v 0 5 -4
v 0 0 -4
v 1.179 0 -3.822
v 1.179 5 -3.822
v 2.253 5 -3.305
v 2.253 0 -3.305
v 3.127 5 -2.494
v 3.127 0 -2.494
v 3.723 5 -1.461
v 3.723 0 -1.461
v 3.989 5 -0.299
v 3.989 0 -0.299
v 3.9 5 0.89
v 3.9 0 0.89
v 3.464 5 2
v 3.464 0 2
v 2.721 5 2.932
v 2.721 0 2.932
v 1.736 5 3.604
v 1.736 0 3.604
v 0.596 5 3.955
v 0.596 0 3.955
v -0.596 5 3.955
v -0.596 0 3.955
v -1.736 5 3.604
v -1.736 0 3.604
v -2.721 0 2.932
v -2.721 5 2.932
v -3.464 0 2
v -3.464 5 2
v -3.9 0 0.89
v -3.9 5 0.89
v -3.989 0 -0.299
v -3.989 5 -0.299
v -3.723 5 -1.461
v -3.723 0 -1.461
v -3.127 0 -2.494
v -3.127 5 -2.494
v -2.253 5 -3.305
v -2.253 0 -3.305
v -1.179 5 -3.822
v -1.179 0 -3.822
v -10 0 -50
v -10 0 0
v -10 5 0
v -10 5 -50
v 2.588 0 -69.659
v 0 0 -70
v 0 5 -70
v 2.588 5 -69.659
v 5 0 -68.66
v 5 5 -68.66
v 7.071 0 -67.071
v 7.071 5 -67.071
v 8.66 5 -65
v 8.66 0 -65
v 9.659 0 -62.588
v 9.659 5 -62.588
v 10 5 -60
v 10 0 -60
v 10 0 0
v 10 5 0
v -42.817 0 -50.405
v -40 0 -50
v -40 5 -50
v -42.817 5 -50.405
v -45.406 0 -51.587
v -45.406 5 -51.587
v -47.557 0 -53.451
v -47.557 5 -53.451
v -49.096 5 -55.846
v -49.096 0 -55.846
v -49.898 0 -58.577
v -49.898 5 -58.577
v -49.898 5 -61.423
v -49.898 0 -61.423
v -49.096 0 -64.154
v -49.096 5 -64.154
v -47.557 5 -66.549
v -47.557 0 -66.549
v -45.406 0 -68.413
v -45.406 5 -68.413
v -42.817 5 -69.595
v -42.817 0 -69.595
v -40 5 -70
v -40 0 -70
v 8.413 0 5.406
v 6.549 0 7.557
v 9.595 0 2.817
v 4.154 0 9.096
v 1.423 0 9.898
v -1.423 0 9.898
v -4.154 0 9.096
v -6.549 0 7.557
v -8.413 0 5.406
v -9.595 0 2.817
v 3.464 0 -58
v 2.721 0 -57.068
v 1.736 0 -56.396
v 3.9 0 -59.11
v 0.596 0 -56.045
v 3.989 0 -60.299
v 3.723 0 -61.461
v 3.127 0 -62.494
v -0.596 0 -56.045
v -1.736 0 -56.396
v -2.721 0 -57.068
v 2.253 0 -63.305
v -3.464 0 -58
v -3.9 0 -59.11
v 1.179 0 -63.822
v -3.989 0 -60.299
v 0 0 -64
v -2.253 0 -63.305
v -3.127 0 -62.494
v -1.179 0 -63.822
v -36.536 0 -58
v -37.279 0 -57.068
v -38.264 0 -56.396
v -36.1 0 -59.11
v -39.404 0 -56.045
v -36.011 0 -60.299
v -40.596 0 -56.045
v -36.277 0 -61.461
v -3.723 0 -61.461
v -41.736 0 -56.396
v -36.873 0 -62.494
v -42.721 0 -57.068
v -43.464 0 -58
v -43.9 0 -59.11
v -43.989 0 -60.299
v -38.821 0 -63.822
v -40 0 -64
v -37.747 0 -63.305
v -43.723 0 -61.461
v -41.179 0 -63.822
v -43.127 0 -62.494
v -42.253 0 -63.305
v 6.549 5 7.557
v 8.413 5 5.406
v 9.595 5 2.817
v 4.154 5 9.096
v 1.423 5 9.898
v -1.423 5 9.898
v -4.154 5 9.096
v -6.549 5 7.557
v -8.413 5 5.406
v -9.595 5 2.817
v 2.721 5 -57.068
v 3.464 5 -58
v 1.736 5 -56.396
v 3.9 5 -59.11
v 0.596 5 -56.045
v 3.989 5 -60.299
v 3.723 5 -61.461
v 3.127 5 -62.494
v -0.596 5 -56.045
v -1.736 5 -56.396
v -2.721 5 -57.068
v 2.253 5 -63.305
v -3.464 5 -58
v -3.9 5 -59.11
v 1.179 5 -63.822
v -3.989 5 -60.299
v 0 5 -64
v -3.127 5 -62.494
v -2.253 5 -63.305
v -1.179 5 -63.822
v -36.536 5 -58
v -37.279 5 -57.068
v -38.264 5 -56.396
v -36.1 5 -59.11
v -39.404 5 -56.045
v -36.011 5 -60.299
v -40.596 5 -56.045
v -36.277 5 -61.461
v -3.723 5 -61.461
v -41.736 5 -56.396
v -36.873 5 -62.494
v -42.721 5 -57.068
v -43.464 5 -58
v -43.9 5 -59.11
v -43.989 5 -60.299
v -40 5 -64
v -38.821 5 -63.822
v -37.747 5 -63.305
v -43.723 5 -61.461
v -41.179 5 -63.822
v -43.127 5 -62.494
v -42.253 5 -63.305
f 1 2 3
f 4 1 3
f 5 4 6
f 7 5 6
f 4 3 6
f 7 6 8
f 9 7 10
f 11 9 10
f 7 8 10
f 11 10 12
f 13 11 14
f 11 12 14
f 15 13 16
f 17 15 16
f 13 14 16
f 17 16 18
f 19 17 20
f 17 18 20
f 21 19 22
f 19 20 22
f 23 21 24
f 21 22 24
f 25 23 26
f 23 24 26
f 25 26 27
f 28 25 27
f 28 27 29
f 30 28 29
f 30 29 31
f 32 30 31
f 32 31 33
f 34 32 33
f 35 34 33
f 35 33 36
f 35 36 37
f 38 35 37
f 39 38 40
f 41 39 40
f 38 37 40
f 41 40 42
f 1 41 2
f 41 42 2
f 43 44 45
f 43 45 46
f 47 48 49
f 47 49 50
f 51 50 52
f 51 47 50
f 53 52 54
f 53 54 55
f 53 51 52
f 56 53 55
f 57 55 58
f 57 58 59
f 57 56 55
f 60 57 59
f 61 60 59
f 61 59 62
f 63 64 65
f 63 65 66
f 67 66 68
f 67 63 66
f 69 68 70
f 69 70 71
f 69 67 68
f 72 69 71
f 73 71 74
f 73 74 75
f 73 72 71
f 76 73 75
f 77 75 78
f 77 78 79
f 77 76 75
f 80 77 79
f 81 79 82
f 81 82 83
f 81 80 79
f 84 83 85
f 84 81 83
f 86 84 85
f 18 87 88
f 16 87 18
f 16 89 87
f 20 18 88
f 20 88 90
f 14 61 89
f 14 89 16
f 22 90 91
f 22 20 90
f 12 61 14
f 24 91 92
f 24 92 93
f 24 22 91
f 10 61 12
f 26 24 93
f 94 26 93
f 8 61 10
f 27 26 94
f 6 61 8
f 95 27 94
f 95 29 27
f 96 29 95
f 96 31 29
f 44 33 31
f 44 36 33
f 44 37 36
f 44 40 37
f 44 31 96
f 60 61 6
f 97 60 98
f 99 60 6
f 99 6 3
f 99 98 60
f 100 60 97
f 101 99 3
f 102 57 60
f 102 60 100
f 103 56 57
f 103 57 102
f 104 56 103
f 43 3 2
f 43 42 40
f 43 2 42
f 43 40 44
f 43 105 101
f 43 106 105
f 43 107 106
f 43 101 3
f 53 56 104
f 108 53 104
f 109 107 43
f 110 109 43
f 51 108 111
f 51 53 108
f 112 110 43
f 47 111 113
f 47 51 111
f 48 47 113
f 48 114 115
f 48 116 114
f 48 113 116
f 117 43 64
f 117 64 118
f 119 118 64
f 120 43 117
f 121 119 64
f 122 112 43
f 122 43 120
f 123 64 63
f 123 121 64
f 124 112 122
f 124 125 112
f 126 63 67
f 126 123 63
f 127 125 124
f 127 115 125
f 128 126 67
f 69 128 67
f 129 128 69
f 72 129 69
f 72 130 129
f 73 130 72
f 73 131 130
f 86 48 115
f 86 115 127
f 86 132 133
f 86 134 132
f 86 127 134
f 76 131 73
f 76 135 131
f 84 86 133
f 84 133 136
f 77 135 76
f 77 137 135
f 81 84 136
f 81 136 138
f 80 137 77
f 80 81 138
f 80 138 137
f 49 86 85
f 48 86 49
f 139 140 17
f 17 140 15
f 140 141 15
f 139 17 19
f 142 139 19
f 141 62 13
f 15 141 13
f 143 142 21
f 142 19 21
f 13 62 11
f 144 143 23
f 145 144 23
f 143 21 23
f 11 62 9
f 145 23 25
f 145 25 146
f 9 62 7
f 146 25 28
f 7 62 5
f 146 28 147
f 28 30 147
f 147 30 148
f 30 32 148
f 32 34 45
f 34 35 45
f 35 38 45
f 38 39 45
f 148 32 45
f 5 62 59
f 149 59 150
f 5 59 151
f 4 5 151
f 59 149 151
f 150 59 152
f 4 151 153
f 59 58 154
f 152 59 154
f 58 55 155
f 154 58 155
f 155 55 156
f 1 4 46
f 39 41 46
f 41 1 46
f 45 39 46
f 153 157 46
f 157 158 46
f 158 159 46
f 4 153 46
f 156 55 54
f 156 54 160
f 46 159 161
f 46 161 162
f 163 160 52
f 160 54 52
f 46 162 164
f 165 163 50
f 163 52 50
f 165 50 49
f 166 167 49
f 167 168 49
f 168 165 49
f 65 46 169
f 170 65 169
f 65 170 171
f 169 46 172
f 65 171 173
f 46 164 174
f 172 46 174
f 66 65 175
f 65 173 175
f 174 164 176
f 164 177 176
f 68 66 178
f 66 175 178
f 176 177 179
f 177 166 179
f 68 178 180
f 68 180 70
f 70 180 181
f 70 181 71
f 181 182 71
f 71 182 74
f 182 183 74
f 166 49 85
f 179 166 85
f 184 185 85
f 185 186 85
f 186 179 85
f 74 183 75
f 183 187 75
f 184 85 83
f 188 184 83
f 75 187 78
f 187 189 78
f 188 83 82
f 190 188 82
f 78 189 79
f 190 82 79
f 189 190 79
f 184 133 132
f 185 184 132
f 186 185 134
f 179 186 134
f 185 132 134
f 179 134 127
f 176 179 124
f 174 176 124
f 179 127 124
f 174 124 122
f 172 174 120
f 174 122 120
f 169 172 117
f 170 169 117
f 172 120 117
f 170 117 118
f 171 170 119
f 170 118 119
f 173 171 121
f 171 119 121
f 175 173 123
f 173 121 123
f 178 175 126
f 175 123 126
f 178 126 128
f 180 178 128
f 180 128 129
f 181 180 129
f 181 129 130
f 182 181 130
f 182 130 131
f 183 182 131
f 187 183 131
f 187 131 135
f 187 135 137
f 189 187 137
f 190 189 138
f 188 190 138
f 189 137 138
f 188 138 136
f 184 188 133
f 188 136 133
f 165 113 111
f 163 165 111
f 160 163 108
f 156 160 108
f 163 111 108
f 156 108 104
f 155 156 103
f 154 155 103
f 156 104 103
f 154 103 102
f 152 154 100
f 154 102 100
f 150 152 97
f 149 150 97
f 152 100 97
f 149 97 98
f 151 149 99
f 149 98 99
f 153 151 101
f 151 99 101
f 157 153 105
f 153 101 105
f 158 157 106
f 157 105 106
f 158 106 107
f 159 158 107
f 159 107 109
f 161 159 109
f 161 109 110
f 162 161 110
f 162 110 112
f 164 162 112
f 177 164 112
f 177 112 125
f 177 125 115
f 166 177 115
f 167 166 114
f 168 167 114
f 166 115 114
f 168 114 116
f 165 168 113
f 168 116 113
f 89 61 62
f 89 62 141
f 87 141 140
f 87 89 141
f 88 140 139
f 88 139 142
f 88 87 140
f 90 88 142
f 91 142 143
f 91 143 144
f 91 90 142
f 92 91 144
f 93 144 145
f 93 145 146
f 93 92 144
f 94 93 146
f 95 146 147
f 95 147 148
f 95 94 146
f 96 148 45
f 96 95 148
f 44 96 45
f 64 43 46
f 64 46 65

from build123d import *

# Parameters (mm, degrees)
BOSS_EXTRUDE1_DEPTH = 5
SKETCH2_R           = 4
CUT_EXTRUDE1_DEPTH  = 5


with BuildPart() as part:
    # Sketch1 → Boss-Extrude1 (new body)
    with BuildSketch(Plane(origin=(0, 0, 0), x_dir=(1, 0, 0), z_dir=(0, 1, 0))):
        with BuildLine():
            Line((-40, 70), (0, 70))
            ThreePointArc((0, 70), (7.071067812, 67.071067812), (10, 60))
            Line((10, 60), (10, 0))
            ThreePointArc((10, 0), (0, -10), (-10, 0))
            Line((-10, 0), (-10, 50))
            Line((-10, 50), (-40, 50))
            ThreePointArc((-40, 50), (-50, 60), (-40, 70))
        make_face()
    extrude(amount=BOSS_EXTRUDE1_DEPTH)

    # Sketch2 → Cut-Extrude1 (cut)
    with BuildSketch(Plane.XZ):
        Circle(SKETCH2_R)
        with Locations((-40, -60)):
            Circle(SKETCH2_R)
        with Locations((0, -60)):
            Circle(SKETCH2_R)
    extrude(amount=-CUT_EXTRUDE1_DEPTH, mode=Mode.SUBTRACT)


solid = part.part
